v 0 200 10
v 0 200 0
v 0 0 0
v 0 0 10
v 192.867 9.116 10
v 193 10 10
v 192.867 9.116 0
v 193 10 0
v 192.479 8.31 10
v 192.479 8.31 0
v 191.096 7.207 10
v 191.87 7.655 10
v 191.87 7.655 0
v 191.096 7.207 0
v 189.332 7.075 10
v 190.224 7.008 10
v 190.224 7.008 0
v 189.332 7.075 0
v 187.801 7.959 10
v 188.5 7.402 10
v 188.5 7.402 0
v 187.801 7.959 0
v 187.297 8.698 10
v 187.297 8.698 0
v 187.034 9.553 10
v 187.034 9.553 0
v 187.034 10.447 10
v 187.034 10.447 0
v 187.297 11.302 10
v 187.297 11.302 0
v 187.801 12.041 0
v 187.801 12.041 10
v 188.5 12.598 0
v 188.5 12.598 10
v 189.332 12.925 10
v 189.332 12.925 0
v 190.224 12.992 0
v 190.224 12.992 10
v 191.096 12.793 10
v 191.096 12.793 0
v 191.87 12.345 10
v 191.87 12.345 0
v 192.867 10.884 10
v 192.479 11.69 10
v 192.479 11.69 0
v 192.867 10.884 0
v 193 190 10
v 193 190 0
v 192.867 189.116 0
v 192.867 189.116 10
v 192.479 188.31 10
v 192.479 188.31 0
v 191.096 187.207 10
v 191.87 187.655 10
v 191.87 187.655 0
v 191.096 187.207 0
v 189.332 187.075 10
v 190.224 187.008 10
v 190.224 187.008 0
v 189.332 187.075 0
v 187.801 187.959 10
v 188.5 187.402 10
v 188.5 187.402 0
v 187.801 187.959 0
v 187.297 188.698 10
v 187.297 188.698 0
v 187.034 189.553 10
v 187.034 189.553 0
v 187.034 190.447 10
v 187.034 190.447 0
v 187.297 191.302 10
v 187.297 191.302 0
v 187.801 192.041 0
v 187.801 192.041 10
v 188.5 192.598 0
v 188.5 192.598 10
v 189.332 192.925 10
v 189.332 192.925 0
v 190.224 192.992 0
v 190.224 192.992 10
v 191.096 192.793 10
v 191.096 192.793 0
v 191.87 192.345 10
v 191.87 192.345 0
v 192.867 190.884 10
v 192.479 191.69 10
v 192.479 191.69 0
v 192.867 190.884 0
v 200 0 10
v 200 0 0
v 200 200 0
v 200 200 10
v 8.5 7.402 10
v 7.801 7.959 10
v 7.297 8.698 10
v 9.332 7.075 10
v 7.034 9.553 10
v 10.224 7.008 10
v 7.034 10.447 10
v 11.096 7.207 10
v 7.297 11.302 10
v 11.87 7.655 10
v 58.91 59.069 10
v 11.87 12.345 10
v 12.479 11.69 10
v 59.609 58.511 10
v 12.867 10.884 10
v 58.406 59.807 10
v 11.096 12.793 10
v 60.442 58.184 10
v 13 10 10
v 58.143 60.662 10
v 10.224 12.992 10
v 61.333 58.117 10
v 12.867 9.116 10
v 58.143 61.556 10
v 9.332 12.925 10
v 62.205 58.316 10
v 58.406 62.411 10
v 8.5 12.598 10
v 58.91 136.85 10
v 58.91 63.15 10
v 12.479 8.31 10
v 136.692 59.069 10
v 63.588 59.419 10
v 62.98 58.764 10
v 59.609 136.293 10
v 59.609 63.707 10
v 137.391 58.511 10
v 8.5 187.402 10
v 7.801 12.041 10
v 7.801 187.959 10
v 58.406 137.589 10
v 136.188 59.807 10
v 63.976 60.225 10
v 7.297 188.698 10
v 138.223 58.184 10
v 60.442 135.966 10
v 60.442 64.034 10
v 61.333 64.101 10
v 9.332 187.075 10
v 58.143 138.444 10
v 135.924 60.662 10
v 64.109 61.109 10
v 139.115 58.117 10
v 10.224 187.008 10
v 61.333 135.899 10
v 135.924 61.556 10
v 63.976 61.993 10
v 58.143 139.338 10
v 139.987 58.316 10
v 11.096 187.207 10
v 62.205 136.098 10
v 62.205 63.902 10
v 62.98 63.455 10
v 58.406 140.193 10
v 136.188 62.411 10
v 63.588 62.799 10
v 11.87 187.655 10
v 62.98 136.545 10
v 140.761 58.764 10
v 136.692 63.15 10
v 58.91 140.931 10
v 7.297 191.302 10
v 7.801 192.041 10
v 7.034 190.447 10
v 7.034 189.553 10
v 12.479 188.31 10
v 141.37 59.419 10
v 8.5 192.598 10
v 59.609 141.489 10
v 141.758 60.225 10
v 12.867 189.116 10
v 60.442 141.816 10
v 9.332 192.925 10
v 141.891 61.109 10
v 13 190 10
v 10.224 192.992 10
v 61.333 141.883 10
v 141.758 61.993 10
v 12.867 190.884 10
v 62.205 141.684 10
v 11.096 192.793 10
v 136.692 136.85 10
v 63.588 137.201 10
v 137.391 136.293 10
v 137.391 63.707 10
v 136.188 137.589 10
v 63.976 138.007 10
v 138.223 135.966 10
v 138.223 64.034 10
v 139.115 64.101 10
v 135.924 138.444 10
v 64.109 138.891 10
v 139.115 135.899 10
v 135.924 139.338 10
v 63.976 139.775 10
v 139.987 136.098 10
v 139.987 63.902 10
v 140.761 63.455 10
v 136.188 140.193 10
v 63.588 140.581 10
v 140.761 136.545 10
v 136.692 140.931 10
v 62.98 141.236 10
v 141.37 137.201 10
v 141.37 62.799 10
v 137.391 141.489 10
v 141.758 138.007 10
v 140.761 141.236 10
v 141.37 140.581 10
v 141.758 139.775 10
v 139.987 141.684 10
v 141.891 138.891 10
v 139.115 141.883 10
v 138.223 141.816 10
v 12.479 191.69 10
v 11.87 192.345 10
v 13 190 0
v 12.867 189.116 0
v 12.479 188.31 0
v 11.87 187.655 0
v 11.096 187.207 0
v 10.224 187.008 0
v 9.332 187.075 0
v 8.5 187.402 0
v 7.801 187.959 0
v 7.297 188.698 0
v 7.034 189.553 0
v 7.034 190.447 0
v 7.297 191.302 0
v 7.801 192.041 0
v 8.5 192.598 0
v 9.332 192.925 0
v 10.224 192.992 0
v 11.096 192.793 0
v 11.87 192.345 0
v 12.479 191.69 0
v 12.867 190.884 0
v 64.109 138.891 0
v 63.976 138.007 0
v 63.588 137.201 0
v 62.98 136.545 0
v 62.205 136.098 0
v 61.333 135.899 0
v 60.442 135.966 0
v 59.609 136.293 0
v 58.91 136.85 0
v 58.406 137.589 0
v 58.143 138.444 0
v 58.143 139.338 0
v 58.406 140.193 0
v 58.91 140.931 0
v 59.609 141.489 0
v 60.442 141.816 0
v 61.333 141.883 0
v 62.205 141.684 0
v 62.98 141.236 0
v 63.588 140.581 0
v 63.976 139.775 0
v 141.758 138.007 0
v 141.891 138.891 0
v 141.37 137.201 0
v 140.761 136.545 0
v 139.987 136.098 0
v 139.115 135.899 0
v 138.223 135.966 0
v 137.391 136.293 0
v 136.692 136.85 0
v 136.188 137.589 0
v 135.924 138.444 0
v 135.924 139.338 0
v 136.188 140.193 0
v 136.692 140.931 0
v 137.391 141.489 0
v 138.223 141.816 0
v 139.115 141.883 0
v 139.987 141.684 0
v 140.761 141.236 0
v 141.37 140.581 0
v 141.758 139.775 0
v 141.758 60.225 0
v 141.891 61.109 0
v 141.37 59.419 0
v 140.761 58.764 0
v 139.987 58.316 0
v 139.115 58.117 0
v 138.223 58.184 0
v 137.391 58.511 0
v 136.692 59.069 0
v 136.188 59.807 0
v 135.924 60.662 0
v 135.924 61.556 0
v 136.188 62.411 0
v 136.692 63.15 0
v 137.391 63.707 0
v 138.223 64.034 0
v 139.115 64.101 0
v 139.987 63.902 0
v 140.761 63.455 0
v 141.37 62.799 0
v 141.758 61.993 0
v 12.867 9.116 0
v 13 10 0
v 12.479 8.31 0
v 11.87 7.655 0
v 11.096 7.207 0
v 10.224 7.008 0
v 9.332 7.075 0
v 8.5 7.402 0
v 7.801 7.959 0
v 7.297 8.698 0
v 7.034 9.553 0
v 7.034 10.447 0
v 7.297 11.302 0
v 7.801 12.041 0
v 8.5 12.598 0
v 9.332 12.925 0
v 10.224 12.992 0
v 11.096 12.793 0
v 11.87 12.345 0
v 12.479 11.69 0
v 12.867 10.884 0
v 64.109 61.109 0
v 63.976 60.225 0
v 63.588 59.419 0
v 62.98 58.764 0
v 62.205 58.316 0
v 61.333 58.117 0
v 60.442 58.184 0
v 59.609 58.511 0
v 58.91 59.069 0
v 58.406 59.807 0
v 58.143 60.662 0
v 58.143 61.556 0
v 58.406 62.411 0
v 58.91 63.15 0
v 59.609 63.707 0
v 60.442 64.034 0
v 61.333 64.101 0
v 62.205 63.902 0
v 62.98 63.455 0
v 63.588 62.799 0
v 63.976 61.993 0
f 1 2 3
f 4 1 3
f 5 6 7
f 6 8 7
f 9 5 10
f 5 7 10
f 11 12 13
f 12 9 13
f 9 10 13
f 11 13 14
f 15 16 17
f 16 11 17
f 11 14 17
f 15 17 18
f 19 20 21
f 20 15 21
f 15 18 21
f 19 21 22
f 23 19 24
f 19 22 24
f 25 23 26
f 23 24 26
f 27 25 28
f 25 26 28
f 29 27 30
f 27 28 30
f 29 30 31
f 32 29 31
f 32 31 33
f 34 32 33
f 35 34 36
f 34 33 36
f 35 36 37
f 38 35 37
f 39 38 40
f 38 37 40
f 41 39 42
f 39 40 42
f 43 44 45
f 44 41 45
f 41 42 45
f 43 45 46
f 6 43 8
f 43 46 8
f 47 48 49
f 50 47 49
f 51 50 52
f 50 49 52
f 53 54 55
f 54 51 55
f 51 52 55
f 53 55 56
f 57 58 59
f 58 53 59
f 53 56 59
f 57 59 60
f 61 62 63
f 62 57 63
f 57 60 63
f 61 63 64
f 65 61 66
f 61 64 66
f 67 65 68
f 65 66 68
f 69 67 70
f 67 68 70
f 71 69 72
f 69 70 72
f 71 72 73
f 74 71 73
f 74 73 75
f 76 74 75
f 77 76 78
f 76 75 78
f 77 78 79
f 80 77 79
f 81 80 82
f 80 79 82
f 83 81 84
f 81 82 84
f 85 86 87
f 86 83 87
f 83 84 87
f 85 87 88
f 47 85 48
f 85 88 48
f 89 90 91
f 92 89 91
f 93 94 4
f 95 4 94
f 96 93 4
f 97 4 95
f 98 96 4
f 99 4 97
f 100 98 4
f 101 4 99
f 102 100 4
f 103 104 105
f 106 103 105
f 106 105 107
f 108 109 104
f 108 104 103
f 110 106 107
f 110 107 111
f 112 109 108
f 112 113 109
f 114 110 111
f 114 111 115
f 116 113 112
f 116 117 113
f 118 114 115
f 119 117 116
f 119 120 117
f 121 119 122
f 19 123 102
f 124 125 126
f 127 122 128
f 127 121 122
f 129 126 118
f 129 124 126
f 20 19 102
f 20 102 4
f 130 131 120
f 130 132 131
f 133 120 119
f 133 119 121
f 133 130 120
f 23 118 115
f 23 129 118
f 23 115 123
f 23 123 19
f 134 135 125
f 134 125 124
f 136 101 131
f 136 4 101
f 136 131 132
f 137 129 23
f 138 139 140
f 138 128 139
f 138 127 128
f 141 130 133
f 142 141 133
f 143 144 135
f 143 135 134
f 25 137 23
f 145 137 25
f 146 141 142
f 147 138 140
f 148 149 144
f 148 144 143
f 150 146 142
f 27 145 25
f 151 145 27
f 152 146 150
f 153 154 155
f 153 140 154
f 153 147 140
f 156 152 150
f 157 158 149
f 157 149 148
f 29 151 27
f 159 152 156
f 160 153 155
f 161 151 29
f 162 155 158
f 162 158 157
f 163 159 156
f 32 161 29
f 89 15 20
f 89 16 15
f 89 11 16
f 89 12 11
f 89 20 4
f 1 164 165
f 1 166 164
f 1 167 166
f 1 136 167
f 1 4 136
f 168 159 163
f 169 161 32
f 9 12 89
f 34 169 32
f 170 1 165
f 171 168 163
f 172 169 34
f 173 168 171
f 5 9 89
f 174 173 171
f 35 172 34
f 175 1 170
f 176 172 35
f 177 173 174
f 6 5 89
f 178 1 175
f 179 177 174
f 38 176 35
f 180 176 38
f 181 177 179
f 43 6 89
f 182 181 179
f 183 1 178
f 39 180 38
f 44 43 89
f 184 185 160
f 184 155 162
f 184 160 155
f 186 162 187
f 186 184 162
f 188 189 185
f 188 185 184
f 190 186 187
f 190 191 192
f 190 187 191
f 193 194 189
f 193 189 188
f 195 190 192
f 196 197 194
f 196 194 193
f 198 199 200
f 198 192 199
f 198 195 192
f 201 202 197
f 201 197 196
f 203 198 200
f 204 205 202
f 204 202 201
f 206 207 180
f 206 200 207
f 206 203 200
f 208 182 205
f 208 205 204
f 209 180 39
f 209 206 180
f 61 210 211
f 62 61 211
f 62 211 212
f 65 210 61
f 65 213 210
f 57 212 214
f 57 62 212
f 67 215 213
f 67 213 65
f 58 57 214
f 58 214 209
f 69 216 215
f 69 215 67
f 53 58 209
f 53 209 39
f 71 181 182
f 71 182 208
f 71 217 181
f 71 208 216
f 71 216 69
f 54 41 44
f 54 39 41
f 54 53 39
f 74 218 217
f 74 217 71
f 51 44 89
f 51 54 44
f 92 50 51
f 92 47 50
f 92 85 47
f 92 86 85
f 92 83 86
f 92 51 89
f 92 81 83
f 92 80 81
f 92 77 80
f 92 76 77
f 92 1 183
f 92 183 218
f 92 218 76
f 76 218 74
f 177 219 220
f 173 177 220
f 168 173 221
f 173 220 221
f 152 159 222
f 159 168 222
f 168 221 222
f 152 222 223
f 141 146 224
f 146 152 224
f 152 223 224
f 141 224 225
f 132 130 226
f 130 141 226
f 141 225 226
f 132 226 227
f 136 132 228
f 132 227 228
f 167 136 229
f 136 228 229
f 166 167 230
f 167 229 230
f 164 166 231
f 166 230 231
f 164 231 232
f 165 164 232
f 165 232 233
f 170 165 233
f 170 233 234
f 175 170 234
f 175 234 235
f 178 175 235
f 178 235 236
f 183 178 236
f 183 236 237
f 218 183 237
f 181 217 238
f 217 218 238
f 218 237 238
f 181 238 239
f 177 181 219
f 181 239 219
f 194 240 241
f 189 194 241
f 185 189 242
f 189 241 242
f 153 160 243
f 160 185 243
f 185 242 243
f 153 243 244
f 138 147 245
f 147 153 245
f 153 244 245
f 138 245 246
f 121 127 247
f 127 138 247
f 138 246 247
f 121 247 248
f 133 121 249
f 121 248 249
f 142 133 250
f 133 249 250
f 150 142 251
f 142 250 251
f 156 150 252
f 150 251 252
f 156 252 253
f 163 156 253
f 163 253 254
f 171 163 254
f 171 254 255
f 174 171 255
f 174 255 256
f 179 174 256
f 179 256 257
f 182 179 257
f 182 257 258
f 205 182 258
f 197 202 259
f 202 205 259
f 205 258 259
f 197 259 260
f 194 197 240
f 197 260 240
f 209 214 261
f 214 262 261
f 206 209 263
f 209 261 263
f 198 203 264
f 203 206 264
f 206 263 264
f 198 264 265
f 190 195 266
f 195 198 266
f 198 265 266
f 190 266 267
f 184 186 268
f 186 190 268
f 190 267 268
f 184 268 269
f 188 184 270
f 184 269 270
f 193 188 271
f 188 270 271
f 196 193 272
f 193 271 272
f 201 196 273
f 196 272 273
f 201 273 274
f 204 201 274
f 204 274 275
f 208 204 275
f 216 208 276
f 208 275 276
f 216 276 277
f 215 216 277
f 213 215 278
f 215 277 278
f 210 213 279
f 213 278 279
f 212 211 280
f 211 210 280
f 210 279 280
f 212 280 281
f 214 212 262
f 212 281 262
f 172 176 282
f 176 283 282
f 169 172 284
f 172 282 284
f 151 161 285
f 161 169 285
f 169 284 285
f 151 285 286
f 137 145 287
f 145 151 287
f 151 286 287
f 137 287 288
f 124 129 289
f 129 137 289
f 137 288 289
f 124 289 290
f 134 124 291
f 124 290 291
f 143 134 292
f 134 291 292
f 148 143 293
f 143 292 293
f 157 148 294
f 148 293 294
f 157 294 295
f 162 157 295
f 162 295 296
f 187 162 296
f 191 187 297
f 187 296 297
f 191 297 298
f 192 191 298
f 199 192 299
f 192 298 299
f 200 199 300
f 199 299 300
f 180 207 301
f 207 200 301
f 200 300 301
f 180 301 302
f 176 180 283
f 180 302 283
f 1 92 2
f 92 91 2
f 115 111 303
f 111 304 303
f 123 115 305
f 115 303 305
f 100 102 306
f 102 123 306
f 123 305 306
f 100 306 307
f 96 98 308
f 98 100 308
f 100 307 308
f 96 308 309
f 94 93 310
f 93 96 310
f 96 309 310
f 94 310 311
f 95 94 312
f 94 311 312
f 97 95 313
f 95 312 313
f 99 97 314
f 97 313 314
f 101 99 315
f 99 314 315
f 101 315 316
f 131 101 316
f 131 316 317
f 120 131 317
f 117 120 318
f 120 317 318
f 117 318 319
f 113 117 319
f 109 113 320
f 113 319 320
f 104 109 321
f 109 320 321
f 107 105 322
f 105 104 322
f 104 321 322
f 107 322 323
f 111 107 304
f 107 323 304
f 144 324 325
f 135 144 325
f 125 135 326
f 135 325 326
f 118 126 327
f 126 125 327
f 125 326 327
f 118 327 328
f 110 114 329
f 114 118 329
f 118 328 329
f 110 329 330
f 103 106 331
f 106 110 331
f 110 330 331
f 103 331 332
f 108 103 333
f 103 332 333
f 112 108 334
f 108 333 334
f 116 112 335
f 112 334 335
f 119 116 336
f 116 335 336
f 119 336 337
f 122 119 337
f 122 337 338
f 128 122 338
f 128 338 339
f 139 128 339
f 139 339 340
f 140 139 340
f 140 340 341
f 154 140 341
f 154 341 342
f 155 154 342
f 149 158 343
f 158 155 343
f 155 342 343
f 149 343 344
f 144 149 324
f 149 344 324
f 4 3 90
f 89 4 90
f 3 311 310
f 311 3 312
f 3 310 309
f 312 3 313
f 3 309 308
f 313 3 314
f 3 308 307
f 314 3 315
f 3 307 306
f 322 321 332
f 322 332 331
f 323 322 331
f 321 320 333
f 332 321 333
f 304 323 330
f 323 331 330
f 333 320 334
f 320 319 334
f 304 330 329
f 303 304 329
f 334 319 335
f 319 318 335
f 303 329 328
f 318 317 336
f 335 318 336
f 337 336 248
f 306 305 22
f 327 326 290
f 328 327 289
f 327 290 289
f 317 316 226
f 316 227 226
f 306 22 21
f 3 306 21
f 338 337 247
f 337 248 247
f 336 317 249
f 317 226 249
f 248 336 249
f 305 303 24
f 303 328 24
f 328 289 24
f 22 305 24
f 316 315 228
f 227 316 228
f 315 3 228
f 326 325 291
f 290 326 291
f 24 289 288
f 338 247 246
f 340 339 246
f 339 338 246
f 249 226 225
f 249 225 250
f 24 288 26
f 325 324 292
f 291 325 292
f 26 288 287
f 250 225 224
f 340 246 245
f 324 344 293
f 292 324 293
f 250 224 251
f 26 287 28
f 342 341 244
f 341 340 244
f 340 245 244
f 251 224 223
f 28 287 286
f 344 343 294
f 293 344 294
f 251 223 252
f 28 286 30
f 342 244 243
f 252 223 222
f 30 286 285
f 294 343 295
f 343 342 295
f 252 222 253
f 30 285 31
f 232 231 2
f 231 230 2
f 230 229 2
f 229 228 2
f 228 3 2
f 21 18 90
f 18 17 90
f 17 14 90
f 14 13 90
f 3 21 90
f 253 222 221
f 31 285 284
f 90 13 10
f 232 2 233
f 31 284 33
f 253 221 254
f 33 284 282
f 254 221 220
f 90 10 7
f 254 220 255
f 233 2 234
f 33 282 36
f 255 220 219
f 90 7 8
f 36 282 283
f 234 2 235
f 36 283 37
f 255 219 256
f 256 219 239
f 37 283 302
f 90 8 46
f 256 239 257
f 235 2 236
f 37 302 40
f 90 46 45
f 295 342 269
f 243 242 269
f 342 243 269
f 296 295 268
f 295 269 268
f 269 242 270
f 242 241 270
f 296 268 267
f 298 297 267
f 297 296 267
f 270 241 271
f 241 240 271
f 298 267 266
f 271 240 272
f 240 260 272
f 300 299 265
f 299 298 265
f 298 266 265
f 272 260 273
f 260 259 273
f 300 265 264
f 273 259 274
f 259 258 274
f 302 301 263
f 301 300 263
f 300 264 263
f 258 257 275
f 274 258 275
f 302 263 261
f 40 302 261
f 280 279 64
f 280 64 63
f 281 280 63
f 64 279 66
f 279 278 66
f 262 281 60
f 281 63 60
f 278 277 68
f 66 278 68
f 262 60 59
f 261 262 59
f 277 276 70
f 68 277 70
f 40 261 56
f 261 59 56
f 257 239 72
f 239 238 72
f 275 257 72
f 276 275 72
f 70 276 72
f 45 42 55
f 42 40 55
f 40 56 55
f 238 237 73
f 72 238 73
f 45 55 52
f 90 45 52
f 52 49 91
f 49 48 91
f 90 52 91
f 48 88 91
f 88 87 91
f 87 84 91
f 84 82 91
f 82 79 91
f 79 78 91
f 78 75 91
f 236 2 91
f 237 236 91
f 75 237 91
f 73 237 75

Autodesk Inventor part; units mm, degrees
ref_plane "YZ Plane" through (0, 0, 0) normal (1, 0, 0) x (0, 1, 0)
ref_plane "XZ Plane" through (0, 0, 0) normal (0, 1, 0) x (-1, 0, 0)
ref_plane "XY Plane" through (0, 0, 0) normal (0, 0, 1) x (1, 0, 0)
sketch "Sketch1" plane through (0, 0, 0) normal (0, 0, 1) x (1, 0, 0)
  line L0 (0, 0) -> (200, 0)
  line L1 (200, 0) -> (200, 200)
  line L2 (200, 200) -> (0, 200)
  line L3 (0, 200) -> (0, 0)
  circle A0 centre (10, 190) radius 3
  circle A1 centre (190, 190) radius 3
  circle A2 centre (190, 10) radius 3
  circle A3 centre (10, 10) radius 3
  circle A4 centre (61.1091, 138.8909) radius 3
  circle A5 centre (61.1091, 61.1091) radius 3
  circle A6 centre (138.8909, 61.1091) radius 3
  circle A7 centre (138.8909, 138.8909) radius 3
  point P0 (164, 100)
  dimension "d1" = 200
  dimension "d5" = 10
  dimension "d6" = 10
  dimension "d7" = 10
  dimension "d8" = 10
  dimension "d9" = 6
  dimension "d10" = 6
  dimension "d11" = 10
  dimension "d12" = 10
  dimension "d14" = 10
  dimension "d15" = 6
  dimension "d16" = 6
  dimension "d17" = 6
  dimension "d18" = 6
  dimension "d19" = 6
  dimension "d20" = 6
  dimension "d42" = 200
  dimension "d43" = 10
extrude "Extrusion2" add sketch "Sketch1" along normal blind 10
thread "Thread1" size "M6x1" class "6H" standard "ANSI Metric M Profile" full length
thread "Thread2" size "M6x1" class "6H" standard "ANSI Metric M Profile" full length
thread "Thread3" size "M6x1" class "6H" standard "ANSI Metric M Profile" full length
thread "Thread4" size "M6x1" class "6H" standard "ANSI Metric M Profile" full length
properties part number "PhlangeForShop"
